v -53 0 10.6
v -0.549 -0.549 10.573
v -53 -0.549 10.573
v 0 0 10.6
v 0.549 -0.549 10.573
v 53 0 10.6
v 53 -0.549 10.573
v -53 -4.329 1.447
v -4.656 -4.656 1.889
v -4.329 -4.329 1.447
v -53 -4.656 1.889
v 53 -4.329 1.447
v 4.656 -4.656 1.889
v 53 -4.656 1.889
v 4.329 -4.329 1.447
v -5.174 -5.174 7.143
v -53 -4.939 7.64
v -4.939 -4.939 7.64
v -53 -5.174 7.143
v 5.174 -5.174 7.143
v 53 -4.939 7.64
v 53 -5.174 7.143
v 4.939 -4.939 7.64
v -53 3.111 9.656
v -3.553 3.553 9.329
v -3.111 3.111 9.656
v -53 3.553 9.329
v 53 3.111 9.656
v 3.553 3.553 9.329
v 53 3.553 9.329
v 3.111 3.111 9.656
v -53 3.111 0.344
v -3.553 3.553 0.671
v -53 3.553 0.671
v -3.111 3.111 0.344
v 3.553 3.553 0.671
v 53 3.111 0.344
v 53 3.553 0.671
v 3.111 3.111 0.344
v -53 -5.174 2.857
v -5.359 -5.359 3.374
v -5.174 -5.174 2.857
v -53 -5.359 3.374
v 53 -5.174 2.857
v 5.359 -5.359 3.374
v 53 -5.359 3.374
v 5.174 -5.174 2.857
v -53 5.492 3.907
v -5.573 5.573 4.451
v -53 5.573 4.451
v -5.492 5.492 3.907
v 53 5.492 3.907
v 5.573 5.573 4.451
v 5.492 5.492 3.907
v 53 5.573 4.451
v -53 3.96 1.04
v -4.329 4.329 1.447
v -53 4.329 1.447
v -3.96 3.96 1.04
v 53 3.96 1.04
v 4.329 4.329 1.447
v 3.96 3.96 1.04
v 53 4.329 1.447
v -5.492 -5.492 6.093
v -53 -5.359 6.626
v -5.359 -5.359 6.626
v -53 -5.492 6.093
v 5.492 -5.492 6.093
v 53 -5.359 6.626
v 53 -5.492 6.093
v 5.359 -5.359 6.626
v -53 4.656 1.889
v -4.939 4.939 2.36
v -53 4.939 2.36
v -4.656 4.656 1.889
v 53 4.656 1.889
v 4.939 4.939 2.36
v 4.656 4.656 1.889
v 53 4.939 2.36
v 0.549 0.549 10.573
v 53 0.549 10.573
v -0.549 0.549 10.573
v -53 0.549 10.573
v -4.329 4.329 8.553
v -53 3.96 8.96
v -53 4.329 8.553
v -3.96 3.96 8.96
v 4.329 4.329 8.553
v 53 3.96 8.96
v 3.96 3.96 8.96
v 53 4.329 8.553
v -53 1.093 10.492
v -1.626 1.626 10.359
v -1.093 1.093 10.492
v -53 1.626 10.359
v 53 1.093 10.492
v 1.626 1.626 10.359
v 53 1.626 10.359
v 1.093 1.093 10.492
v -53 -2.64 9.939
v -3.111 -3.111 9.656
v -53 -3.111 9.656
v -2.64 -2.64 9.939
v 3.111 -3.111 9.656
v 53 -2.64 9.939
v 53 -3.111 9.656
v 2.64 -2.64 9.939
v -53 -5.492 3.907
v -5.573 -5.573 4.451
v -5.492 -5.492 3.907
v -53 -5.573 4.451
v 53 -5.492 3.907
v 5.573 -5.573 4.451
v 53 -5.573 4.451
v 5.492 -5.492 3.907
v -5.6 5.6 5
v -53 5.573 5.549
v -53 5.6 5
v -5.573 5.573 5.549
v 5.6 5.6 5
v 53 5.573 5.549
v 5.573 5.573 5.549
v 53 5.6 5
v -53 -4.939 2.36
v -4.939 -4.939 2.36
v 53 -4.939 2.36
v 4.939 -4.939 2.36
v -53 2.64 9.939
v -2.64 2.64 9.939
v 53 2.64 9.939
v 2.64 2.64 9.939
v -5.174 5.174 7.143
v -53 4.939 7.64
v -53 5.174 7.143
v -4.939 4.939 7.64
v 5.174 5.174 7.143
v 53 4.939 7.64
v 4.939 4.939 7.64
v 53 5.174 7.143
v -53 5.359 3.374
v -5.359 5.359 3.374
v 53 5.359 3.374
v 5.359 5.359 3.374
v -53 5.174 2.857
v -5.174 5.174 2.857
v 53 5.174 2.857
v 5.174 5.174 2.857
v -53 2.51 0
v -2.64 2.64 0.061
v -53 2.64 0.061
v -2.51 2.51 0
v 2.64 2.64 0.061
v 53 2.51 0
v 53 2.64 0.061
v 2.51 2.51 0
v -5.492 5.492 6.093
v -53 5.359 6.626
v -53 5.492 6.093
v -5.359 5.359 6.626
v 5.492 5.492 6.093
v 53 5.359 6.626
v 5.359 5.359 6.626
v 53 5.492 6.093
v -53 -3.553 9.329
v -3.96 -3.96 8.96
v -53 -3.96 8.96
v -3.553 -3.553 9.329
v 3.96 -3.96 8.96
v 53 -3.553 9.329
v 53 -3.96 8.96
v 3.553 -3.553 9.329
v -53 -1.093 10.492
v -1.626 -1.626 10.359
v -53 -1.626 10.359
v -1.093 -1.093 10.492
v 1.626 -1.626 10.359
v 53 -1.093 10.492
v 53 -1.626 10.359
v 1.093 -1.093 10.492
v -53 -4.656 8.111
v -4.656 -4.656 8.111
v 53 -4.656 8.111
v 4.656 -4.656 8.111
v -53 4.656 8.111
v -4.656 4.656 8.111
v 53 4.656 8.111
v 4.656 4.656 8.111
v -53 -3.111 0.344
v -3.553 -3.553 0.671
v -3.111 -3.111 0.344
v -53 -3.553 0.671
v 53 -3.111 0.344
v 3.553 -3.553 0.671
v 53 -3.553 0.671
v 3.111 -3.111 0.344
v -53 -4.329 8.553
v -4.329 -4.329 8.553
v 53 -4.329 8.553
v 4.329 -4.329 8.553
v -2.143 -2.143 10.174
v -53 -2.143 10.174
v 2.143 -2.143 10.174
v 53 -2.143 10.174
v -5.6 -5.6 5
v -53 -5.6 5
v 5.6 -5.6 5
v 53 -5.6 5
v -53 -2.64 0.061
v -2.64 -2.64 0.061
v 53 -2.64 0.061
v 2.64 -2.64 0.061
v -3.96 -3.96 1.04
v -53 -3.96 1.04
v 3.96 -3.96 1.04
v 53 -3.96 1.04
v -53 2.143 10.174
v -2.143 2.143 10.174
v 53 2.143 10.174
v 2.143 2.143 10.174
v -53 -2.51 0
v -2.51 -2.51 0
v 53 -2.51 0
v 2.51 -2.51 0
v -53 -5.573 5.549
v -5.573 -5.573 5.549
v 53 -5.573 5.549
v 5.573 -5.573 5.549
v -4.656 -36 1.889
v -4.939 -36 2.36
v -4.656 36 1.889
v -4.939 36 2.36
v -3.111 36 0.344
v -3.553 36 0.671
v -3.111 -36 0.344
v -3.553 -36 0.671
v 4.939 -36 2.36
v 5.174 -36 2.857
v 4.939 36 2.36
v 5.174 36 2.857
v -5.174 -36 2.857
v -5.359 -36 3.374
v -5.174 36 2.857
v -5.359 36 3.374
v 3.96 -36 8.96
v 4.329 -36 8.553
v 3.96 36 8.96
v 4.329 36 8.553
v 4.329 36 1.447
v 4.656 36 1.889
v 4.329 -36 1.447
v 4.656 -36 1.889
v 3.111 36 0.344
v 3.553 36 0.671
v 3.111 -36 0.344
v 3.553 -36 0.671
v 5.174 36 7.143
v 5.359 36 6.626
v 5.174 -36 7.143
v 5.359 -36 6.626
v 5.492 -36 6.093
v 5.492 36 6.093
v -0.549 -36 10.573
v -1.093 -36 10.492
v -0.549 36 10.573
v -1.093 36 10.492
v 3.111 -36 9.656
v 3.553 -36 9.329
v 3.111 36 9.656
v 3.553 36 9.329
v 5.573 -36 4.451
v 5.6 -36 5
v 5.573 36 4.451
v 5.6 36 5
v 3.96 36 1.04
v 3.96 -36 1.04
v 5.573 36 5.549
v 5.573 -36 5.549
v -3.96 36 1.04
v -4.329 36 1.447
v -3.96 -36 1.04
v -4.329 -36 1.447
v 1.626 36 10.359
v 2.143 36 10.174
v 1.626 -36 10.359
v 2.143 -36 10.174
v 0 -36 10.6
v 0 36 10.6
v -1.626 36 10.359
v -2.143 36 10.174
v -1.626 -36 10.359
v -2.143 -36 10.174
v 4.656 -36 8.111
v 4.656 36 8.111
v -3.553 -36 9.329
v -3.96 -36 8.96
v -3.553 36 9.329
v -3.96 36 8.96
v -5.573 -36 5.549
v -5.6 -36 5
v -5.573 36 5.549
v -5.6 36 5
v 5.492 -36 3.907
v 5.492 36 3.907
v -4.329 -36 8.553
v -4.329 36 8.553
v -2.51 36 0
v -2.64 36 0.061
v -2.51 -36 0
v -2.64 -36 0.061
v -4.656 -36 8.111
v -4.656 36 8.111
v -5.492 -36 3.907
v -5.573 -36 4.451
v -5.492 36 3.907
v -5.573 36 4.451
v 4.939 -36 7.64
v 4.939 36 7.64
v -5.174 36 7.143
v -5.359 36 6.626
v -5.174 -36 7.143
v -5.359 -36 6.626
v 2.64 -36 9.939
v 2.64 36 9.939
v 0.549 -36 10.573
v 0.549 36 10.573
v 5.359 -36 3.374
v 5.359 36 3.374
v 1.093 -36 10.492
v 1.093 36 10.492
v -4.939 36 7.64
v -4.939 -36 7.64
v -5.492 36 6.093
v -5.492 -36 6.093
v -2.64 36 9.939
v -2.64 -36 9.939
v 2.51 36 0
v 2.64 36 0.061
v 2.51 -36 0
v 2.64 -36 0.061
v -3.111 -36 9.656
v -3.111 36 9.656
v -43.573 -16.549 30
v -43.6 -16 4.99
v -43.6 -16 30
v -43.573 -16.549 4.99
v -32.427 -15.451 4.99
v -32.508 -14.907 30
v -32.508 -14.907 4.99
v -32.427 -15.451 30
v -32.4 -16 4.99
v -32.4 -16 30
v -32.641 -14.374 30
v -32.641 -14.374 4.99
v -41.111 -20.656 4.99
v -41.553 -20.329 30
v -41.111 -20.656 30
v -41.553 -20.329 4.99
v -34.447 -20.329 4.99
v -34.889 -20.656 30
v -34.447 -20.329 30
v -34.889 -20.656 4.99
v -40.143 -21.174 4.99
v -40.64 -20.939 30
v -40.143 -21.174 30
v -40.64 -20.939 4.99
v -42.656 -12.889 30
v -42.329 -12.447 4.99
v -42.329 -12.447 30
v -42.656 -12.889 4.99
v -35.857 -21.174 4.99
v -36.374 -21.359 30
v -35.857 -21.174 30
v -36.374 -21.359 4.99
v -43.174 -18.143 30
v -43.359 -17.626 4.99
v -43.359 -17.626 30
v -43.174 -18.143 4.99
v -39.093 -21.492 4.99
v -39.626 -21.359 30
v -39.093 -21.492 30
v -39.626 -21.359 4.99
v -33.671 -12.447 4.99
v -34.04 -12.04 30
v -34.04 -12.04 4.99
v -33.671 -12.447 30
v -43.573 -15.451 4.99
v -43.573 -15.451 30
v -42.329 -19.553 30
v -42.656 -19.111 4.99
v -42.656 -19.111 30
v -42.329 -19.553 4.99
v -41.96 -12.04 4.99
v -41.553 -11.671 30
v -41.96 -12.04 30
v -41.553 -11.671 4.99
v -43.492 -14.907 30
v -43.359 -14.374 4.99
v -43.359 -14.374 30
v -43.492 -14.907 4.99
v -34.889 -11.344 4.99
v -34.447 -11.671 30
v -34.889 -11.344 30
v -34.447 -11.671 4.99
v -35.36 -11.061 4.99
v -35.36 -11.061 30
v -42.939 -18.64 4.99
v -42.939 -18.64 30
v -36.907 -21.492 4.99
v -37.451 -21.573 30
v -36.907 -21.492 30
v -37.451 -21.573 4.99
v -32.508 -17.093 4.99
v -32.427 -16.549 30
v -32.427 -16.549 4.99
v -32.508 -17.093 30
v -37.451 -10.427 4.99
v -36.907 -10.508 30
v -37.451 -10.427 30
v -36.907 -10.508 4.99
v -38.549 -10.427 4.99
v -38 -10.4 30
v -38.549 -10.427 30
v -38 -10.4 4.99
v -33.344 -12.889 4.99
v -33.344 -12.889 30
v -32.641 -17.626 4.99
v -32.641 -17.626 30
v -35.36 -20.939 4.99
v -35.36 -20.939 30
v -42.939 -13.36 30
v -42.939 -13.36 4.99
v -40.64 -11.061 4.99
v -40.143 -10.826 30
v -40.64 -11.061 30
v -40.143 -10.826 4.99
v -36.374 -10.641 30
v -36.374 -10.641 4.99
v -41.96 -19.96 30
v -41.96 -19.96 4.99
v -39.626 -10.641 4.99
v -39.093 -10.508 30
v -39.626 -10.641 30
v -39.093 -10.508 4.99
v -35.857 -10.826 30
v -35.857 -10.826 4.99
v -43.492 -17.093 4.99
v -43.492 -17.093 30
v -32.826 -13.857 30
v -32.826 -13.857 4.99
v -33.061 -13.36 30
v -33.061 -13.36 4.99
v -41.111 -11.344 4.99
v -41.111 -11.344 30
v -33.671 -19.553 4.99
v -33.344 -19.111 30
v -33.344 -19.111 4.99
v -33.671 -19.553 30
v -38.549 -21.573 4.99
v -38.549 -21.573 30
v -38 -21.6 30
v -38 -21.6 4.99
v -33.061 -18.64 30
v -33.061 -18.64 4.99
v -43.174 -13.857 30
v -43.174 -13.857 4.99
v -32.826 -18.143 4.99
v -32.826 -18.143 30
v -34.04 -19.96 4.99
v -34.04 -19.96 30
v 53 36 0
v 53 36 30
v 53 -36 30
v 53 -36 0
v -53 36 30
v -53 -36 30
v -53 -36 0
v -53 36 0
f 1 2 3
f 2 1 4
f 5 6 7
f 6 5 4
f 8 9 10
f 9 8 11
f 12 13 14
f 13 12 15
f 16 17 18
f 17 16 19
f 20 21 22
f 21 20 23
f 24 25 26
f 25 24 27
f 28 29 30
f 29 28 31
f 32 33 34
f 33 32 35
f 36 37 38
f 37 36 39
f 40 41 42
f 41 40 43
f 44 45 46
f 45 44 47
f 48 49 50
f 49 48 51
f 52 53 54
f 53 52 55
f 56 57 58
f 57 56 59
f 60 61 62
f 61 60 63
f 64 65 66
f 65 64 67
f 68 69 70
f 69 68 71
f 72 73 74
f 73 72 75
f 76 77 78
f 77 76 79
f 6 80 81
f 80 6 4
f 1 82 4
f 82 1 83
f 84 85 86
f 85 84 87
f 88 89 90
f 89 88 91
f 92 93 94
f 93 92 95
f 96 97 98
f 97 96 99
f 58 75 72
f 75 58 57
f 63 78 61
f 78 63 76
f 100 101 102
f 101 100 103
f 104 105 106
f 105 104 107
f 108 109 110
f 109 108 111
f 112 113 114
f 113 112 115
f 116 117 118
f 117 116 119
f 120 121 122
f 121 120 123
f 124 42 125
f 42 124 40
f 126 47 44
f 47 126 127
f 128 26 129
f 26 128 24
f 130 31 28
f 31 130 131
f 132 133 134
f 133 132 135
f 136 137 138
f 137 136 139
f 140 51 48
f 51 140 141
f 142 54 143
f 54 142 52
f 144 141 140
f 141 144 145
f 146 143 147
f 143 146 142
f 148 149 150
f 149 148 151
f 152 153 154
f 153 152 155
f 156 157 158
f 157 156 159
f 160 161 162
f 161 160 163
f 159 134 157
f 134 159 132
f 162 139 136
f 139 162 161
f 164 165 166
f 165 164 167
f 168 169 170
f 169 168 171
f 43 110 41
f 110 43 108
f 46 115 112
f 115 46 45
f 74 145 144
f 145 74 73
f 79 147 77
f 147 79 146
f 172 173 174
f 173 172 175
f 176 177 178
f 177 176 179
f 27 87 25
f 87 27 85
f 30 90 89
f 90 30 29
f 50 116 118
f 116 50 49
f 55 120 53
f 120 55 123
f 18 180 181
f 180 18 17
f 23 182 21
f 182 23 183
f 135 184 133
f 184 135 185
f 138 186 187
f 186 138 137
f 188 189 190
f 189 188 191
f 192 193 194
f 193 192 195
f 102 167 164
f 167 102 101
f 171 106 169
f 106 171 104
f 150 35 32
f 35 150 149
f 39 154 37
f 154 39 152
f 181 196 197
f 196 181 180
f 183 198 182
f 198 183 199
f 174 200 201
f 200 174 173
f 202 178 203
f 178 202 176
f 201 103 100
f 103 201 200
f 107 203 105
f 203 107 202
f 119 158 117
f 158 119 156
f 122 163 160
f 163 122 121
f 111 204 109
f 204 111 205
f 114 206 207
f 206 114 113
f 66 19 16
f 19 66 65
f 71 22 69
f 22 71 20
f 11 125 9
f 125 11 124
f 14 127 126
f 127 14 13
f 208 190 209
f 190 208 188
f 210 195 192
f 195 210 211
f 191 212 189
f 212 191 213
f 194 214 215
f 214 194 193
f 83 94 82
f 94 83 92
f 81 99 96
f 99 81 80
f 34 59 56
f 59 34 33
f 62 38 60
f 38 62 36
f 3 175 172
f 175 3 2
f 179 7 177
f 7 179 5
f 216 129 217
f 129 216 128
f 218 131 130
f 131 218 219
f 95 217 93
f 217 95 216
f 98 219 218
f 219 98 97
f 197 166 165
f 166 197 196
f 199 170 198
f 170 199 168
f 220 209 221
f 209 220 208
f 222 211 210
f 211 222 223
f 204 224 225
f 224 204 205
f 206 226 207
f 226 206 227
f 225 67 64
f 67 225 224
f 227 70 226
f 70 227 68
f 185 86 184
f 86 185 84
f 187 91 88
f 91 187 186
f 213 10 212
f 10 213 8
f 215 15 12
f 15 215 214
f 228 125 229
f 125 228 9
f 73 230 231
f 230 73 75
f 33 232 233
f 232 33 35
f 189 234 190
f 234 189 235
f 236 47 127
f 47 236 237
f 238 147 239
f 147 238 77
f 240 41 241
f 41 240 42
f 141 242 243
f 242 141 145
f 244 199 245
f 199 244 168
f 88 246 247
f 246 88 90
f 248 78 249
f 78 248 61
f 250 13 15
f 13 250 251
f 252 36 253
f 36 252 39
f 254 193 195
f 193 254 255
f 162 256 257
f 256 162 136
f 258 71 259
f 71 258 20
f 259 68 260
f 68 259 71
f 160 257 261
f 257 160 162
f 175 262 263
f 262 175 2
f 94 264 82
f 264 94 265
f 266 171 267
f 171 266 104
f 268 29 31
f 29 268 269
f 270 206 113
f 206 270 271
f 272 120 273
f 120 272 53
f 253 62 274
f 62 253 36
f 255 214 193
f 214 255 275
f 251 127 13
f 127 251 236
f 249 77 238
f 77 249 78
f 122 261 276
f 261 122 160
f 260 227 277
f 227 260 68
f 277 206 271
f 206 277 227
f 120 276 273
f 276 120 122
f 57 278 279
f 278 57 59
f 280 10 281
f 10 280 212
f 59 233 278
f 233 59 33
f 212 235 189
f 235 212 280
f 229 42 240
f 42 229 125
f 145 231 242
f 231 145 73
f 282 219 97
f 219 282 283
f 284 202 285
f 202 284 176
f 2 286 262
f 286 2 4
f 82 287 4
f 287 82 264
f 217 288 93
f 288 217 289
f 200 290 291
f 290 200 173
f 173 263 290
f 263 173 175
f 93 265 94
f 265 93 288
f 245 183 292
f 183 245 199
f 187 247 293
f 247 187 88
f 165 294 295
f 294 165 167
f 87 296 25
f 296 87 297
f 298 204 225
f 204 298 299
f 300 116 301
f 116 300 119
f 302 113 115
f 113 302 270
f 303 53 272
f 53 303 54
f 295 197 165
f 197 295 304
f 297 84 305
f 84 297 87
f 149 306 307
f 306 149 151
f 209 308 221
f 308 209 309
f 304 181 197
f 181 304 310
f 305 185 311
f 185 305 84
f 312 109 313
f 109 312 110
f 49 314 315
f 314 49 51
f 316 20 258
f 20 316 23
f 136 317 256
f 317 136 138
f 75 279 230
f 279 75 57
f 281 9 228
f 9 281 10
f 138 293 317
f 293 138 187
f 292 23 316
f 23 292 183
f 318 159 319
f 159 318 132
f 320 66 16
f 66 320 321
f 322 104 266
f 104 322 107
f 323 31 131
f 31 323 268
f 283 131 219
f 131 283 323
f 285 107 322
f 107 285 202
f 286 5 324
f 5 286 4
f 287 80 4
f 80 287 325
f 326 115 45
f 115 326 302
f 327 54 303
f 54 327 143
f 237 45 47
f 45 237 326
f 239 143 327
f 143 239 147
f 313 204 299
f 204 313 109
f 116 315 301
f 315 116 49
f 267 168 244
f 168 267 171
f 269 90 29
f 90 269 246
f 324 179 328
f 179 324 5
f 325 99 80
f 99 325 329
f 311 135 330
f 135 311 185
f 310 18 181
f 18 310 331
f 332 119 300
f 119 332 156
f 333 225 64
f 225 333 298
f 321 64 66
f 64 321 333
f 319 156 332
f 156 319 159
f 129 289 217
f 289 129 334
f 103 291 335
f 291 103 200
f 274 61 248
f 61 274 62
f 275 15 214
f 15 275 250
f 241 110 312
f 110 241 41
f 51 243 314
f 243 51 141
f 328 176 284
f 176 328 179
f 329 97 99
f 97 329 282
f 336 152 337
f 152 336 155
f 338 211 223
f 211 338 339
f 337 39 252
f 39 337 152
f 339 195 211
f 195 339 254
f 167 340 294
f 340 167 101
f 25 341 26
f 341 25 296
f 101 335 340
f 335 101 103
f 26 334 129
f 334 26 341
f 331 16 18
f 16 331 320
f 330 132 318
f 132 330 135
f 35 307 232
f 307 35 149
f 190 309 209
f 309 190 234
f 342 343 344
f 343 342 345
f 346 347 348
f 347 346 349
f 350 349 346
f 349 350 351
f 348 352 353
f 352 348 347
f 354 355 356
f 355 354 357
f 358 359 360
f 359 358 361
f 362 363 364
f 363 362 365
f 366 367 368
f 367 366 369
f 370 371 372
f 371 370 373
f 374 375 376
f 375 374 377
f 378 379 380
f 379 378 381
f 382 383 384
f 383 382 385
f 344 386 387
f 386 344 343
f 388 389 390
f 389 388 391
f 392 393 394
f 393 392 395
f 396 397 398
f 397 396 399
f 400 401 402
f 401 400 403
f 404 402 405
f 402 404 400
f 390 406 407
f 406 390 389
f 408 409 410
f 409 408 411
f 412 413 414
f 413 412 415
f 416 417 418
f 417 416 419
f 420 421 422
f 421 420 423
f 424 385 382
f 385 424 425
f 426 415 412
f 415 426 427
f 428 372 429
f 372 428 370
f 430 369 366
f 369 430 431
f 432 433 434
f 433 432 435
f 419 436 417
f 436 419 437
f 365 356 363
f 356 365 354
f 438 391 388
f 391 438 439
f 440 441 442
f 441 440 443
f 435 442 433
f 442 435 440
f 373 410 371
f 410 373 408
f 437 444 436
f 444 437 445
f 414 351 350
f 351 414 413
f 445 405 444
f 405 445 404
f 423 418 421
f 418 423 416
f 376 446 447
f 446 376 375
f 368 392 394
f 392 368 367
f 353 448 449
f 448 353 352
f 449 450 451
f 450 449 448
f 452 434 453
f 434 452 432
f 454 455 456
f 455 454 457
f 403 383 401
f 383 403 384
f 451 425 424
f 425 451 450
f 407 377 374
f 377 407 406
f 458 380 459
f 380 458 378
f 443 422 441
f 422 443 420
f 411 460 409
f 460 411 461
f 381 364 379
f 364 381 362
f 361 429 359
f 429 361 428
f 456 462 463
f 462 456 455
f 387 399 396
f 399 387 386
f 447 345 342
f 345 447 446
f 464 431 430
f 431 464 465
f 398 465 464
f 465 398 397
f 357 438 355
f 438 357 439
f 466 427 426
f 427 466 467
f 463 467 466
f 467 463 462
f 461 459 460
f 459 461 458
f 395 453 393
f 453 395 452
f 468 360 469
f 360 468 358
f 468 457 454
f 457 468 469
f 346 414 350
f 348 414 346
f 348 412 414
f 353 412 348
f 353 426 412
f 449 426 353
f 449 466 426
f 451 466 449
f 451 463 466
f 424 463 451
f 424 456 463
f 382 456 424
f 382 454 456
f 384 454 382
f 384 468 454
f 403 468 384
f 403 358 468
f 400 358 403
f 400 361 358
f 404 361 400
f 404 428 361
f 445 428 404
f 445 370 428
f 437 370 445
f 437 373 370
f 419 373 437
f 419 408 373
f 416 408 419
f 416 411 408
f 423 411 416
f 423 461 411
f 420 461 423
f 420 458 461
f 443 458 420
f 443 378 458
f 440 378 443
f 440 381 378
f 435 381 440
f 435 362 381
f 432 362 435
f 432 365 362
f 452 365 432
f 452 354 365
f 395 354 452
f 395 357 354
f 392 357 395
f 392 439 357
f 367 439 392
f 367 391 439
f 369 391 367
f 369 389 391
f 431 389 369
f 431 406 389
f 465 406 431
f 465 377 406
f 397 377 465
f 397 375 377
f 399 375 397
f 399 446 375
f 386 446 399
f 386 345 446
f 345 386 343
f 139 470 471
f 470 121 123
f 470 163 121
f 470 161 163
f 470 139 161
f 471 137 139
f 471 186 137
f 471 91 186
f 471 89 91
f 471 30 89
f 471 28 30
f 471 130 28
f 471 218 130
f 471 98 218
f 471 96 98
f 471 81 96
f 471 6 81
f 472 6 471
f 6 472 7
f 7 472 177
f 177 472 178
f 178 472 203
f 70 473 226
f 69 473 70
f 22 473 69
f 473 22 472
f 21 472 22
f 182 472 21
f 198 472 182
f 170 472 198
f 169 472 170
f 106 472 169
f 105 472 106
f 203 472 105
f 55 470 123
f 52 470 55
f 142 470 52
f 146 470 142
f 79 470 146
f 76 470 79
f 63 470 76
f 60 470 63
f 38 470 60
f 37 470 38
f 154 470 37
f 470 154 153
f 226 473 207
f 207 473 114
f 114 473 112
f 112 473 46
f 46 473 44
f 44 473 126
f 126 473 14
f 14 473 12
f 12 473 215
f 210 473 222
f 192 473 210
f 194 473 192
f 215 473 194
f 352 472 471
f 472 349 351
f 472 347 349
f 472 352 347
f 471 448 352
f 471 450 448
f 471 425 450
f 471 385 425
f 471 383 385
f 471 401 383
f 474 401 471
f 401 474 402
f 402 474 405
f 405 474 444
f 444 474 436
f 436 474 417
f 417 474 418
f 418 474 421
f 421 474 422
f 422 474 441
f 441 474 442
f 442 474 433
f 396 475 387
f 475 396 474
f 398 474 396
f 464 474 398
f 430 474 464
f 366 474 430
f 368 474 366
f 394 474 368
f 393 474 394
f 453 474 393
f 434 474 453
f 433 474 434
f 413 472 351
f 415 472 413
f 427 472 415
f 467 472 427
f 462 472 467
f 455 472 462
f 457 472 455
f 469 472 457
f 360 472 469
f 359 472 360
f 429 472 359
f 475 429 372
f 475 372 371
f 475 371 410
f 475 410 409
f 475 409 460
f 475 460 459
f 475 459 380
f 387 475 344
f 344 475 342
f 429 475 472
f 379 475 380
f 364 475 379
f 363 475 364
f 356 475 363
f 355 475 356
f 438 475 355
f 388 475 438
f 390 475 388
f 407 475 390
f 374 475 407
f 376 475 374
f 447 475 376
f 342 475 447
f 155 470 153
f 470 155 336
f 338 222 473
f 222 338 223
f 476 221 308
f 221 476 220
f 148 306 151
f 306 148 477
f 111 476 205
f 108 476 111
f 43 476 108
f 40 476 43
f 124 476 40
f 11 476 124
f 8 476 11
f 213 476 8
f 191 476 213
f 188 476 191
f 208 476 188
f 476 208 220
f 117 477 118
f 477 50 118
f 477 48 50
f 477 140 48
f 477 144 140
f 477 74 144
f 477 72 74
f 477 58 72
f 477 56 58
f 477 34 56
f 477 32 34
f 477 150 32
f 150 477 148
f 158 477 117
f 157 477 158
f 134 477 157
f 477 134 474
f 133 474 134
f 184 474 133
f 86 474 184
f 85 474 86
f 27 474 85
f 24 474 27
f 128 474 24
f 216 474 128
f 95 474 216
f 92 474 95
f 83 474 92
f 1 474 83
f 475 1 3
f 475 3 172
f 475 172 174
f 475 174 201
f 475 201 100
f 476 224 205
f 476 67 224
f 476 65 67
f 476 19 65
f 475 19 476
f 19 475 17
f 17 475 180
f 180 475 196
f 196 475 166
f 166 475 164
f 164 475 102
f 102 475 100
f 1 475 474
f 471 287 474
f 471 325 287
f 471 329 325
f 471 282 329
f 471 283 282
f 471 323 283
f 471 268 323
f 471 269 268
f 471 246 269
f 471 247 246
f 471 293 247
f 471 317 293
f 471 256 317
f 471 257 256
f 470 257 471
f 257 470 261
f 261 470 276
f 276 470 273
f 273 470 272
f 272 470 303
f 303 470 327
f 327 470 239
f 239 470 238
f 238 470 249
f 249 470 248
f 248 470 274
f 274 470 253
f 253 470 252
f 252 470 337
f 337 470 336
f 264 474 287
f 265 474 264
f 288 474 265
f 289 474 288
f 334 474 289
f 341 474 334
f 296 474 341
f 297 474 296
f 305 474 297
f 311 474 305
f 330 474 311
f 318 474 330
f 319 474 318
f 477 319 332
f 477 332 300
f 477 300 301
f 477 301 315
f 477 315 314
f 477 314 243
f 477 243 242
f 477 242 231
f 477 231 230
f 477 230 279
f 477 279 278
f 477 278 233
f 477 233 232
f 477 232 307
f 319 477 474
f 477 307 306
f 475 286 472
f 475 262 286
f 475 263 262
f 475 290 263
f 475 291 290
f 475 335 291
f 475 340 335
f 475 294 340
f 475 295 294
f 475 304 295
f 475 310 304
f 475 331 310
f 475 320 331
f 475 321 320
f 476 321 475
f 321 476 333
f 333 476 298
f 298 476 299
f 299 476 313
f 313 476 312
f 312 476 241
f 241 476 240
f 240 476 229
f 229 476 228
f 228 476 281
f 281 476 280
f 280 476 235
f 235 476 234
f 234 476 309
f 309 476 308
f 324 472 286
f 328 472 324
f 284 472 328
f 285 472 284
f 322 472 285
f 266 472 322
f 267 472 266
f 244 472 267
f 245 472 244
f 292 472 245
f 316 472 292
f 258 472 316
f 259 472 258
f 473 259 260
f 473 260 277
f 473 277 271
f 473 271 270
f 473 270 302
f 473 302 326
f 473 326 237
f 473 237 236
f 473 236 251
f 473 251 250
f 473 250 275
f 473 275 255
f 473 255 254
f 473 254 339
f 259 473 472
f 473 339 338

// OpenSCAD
// Built by bench/smallmodels/features/compiler.py from a list of features.
$fn = 64;
difference() {
  union() {
    translate([0, 0, 0]) translate([-53, -36, 0]) cube([106, 72, 30]);
  }
  union() {
    translate([0, 0, 5]) rotate([0, 0, 0]) rotate([0, 90, 0]) cylinder(d = 11.2, h = 1120, center = true);
    translate([0, 0, 5]) rotate([0, 0, 0]) rotate([90, 0, 0]) cylinder(d = 11.2, h = 1120, center = true);
    translate([-38, -16, 4.99]) rotate([0, 0, 0]) cylinder(d = 11.2, h = 25.02);
  }
}
